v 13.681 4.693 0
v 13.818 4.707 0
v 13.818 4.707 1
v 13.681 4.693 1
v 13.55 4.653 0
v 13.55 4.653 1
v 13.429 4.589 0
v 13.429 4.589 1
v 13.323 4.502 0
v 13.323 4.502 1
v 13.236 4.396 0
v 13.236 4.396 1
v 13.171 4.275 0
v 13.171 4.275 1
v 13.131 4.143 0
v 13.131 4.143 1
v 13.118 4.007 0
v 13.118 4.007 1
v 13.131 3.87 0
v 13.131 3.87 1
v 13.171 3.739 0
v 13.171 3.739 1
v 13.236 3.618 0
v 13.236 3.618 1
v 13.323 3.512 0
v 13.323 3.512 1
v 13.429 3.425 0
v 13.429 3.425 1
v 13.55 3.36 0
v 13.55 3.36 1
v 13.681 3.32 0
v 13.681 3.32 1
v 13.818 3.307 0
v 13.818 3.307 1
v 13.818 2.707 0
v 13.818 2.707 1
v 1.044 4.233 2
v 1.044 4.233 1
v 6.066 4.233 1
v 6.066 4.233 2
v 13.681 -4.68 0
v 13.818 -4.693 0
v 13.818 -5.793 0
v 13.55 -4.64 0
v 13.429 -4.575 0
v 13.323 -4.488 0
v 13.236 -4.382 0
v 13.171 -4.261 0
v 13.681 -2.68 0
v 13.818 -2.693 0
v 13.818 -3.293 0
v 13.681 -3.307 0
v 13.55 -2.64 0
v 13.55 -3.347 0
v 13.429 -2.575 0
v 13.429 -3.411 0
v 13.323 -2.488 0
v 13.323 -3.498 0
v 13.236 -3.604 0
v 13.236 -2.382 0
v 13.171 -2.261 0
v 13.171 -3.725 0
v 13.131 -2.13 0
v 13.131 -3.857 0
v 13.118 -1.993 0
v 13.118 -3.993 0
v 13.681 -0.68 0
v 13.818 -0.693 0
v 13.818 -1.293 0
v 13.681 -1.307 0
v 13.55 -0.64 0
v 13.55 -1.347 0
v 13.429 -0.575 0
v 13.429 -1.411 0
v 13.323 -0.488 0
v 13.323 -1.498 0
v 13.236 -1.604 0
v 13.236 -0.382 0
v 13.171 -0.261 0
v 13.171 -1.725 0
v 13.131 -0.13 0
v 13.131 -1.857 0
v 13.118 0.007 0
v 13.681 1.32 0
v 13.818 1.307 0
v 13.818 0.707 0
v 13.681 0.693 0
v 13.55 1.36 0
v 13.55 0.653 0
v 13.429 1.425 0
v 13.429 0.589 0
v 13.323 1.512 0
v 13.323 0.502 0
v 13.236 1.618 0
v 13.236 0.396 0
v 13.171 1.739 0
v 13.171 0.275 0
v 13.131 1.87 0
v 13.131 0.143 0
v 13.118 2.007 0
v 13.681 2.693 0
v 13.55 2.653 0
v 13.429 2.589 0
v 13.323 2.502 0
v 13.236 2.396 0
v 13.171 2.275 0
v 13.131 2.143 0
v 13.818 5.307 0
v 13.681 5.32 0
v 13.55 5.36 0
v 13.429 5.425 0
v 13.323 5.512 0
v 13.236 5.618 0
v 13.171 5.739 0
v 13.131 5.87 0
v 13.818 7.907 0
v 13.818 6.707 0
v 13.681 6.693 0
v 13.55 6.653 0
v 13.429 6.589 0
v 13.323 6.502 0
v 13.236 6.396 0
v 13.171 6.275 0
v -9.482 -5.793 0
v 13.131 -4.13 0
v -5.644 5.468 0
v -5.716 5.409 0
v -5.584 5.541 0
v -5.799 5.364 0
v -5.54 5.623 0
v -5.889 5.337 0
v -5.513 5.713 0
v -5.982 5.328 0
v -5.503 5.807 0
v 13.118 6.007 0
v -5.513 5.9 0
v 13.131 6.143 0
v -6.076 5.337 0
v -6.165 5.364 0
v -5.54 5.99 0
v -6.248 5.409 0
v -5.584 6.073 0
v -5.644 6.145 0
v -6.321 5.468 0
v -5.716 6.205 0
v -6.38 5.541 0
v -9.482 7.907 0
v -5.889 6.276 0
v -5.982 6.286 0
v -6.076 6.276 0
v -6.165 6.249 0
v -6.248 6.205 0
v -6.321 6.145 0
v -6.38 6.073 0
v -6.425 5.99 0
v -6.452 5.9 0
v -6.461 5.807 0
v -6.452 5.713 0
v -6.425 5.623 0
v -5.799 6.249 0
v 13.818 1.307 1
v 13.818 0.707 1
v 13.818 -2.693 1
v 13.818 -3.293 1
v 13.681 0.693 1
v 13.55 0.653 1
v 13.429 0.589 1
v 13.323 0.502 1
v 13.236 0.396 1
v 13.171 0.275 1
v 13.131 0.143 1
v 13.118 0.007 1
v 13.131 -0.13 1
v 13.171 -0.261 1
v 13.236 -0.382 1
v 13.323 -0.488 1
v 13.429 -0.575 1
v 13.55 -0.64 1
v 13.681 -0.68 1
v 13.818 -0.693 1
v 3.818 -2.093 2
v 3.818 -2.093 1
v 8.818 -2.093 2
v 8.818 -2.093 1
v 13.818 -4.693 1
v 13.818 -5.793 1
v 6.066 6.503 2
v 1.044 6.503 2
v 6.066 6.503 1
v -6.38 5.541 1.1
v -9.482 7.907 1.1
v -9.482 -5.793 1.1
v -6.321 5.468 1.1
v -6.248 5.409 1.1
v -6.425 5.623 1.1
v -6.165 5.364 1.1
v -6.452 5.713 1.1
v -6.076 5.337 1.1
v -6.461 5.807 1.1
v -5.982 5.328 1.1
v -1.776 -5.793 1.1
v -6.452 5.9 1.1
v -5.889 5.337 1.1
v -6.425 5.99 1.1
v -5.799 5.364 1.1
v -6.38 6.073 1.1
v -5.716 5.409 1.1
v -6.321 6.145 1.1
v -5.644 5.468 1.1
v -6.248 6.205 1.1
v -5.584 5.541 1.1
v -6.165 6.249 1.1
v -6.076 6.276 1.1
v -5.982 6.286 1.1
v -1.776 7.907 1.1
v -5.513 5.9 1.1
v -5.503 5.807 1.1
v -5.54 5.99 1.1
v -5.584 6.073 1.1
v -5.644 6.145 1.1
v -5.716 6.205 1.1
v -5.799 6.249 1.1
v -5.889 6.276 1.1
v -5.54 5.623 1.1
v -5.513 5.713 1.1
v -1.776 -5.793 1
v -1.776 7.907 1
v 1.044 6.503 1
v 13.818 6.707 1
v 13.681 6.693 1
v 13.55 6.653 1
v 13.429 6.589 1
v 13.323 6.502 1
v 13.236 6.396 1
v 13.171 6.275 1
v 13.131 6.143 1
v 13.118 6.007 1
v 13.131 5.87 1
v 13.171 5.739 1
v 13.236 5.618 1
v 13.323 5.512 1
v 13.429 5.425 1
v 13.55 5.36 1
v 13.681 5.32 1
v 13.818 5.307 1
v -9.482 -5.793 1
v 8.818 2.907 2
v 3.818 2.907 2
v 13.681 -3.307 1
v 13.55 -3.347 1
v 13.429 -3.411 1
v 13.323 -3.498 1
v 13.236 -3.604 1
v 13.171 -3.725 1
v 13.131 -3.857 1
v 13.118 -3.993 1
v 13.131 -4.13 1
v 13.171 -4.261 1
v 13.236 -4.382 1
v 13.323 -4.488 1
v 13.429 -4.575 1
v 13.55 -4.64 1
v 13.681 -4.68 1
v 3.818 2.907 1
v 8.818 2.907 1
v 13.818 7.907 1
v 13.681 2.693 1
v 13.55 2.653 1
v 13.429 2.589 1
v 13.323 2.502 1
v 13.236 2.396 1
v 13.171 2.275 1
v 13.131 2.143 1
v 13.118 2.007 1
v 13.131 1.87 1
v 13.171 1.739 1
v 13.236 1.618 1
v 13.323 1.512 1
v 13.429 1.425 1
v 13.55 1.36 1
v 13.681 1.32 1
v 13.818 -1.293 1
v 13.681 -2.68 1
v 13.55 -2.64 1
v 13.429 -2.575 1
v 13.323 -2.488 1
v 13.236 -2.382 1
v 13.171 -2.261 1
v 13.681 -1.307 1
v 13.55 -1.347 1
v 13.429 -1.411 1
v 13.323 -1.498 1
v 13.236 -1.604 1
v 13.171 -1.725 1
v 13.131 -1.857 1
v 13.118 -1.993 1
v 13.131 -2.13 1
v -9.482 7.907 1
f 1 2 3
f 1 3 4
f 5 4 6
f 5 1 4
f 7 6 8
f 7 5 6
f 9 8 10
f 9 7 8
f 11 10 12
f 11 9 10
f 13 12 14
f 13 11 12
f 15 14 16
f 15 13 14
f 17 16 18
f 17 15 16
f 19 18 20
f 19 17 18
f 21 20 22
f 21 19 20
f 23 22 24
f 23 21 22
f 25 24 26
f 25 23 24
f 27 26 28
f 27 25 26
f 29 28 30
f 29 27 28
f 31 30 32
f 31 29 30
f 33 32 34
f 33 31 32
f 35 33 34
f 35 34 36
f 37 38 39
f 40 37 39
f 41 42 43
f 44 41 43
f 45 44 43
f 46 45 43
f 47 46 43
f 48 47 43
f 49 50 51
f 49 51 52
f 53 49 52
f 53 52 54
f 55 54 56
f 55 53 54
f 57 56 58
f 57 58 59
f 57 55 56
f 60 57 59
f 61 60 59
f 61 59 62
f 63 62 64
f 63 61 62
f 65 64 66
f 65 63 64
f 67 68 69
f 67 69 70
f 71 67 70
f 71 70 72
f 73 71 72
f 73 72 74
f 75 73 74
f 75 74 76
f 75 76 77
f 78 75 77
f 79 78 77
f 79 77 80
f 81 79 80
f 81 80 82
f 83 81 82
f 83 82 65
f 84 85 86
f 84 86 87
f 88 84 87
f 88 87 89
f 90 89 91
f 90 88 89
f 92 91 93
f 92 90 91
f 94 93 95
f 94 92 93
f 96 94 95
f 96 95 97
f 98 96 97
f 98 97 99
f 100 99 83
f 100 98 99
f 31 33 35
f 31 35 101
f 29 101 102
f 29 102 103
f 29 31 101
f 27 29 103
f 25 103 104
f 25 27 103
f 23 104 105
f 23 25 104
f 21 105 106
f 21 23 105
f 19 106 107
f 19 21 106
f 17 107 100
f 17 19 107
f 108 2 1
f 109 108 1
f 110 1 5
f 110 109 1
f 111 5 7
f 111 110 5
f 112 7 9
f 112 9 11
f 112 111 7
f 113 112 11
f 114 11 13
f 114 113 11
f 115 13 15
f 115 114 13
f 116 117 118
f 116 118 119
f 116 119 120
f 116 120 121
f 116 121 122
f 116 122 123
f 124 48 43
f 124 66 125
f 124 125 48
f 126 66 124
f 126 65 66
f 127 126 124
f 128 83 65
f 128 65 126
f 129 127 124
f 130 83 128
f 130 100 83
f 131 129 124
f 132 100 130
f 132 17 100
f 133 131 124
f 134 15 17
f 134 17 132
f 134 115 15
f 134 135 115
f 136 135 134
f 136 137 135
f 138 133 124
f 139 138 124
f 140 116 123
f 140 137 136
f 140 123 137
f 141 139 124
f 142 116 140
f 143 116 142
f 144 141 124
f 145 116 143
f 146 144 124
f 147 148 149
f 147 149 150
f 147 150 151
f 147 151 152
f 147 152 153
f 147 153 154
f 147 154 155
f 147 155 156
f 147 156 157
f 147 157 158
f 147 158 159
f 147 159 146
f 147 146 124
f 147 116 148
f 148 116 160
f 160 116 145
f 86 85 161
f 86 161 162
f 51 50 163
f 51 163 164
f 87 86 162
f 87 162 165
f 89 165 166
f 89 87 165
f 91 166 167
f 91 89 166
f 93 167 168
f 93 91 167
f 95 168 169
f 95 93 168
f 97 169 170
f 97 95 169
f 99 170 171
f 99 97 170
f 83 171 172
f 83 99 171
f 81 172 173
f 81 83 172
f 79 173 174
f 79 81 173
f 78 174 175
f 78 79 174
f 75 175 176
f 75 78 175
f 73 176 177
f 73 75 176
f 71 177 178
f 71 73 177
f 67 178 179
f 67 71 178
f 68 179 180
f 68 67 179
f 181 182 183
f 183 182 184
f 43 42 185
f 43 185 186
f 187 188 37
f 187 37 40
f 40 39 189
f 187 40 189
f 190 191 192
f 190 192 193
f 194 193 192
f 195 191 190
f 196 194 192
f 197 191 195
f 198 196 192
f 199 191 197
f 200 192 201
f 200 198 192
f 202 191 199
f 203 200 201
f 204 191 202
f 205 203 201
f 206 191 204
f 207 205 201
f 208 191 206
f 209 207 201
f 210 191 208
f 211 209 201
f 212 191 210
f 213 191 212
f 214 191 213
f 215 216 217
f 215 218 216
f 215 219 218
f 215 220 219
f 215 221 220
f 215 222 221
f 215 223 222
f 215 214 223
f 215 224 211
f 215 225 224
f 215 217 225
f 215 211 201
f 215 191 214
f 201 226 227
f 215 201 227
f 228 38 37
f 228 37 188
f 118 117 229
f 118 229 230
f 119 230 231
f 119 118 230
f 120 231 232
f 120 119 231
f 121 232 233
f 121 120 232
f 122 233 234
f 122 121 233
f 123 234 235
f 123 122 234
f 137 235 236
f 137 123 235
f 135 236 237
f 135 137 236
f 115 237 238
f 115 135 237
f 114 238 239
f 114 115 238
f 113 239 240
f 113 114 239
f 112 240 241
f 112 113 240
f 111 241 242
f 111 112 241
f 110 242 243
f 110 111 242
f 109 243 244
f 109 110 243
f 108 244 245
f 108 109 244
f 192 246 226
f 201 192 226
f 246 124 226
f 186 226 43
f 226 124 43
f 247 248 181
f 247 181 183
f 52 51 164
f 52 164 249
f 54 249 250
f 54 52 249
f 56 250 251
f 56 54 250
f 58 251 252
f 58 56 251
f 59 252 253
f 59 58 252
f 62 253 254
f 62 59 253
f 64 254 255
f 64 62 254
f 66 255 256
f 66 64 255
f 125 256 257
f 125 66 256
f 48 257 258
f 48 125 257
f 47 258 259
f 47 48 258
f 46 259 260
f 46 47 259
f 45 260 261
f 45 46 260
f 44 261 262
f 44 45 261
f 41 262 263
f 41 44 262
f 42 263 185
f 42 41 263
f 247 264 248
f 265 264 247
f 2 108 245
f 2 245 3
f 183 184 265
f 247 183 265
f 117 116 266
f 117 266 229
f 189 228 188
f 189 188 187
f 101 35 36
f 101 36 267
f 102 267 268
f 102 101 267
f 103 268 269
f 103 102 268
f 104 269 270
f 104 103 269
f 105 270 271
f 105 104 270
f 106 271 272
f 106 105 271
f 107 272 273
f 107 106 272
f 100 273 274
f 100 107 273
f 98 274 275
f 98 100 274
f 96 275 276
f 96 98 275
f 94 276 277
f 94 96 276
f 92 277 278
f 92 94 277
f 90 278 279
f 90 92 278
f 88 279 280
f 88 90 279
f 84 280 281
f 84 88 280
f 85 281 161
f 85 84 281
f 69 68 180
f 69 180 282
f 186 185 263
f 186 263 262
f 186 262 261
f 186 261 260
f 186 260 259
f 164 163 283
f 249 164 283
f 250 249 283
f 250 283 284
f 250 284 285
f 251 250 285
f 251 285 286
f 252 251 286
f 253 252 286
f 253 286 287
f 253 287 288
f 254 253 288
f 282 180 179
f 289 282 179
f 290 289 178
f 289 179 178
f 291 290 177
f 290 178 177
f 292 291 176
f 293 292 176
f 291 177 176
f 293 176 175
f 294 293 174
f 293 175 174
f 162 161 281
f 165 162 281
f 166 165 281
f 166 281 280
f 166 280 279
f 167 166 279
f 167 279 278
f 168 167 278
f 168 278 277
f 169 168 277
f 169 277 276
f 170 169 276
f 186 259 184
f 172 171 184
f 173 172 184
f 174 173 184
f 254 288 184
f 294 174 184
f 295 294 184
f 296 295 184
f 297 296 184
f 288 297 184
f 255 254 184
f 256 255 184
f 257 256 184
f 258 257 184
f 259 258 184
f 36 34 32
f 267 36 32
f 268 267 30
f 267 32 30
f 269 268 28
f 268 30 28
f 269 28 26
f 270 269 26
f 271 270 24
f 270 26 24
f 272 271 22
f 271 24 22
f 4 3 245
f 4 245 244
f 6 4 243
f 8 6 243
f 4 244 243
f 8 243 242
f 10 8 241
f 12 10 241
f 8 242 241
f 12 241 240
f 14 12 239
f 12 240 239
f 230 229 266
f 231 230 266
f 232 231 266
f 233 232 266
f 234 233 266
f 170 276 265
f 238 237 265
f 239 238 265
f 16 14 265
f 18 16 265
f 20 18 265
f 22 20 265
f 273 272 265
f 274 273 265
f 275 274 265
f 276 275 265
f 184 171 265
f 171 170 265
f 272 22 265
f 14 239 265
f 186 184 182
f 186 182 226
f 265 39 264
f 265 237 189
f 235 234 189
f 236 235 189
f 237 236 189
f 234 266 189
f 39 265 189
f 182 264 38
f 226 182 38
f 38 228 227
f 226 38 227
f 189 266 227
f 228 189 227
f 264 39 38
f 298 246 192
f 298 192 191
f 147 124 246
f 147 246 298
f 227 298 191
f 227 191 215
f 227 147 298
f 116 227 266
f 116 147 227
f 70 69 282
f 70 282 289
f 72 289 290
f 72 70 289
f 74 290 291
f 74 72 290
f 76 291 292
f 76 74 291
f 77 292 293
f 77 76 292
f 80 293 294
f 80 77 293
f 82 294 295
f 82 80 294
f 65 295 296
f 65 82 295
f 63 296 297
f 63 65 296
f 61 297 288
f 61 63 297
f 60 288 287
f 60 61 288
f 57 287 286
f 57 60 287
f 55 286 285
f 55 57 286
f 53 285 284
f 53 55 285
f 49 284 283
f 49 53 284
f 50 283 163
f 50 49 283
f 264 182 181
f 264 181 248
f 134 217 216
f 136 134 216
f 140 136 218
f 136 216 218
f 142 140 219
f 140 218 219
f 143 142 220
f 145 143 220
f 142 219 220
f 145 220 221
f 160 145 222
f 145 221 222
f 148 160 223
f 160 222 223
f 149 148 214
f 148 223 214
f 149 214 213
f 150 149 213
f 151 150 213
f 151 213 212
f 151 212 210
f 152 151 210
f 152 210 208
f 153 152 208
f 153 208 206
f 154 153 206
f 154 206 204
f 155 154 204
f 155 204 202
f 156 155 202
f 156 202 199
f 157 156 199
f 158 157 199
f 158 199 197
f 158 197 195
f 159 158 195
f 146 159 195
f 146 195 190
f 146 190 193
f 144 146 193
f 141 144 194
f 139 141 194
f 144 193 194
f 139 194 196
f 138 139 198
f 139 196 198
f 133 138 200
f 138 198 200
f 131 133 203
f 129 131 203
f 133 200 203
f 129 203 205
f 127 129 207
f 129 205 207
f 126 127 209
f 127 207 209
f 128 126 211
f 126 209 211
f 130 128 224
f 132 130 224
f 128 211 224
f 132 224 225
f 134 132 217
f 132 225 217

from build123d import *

# Parameters (mm, degrees)
BOSS_EXTRUDE1_DEPTH = 1
SKETCH2_W           = 7.706049631
SKETCH2_H           = 13.7
BOSS_EXTRUDE2_DEPTH = 0.1
SKETCH3_R           = 0.478791287
CUT_EXTRUDE1_DEPTH  = 2.1
SKETCH4_W           = 5
SKETCH4_H           = 5
BOSS_EXTRUDE3_DEPTH = 1
SKETCH6_W           = 5.021657736
SKETCH6_H           = 2.270064456
BOSS_EXTRUDE5_DEPTH = 1


with BuildPart() as part:
    # Sketch1 → Boss-Extrude1 (new body)
    with BuildSketch(Plane.XY):
        with BuildLine():
            Line((13.817814776, 5.306721311), (13.817814776, 4.706721311))
            ThreePointArc((13.817814776, 4.706721311), (13.117814776, 4.006721311), (13.817814776, 3.306721311))
            Line((13.817814776, 3.306721311), (13.817814776, 2.706721311))
            ThreePointArc((13.817814776, 2.706721311), (13.117814776, 2.006721311), (13.817814776, 1.306721311))
            Line((13.817814776, 1.306721311), (13.817814776, 0.706721311))
            ThreePointArc((13.817814776, 0.706721311), (13.117814776, 0.006721311), (13.817814776, -0.693278689))
            Line((13.817814776, -0.693278689), (13.817814776, -1.293278689))
            ThreePointArc((13.817814776, -1.293278689), (13.117814776, -1.993278689), (13.817814776, -2.693278689))
            Line((13.817814776, -2.693278689), (13.817814776, -3.293278689))
            ThreePointArc((13.817814776, -3.293278689), (13.117814776, -3.993278689), (13.817814776, -4.693278689))
            Line((13.817814776, -4.693278689), (13.817814776, -5.793278689))
            Line((13.817814776, -5.793278689), (-9.482185224, -5.793278689))
            Line((-9.482185224, -5.793278689), (-9.482185224, 7.906721311))
            Line((-9.482185224, 7.906721311), (13.817814776, 7.906721311))
            Line((13.817814776, 7.906721311), (13.817814776, 6.706721311))
            ThreePointArc((13.817814776, 6.706721311), (13.117814776, 6.006721311), (13.817814776, 5.306721311))
        make_face()
    extrude(amount=BOSS_EXTRUDE1_DEPTH)

    # Sketch2 → Boss-Extrude2 (add)
    with BuildSketch(Plane.XY.offset(1)):
        with Locations((-5.629160408, 1.056721311)):
            Rectangle(SKETCH2_W, SKETCH2_H)
    extrude(amount=BOSS_EXTRUDE2_DEPTH)

    # Sketch3 → Cut-Extrude1 (cut)
    with BuildSketch(Plane.XY.offset(1.1)):
        with Locations((-5.982185224, 5.806721311)):
            Circle(SKETCH3_R)
    extrude(amount=-CUT_EXTRUDE1_DEPTH, mode=Mode.SUBTRACT)

    # Sketch4 → Boss-Extrude3 (add)
    with BuildSketch(Plane.XY.offset(1)):
        with Locations((6.317814776, 0.406721311)):
            Rectangle(SKETCH4_W, SKETCH4_H)
    extrude(amount=BOSS_EXTRUDE3_DEPTH)

    # Sketch6 → Boss-Extrude5 (add)
    with BuildSketch(Plane.XY.offset(1)):
        with Locations((3.555076388, 5.367550784)):
            Rectangle(SKETCH6_W, SKETCH6_H)
    extrude(amount=BOSS_EXTRUDE5_DEPTH)


solid = part.part
